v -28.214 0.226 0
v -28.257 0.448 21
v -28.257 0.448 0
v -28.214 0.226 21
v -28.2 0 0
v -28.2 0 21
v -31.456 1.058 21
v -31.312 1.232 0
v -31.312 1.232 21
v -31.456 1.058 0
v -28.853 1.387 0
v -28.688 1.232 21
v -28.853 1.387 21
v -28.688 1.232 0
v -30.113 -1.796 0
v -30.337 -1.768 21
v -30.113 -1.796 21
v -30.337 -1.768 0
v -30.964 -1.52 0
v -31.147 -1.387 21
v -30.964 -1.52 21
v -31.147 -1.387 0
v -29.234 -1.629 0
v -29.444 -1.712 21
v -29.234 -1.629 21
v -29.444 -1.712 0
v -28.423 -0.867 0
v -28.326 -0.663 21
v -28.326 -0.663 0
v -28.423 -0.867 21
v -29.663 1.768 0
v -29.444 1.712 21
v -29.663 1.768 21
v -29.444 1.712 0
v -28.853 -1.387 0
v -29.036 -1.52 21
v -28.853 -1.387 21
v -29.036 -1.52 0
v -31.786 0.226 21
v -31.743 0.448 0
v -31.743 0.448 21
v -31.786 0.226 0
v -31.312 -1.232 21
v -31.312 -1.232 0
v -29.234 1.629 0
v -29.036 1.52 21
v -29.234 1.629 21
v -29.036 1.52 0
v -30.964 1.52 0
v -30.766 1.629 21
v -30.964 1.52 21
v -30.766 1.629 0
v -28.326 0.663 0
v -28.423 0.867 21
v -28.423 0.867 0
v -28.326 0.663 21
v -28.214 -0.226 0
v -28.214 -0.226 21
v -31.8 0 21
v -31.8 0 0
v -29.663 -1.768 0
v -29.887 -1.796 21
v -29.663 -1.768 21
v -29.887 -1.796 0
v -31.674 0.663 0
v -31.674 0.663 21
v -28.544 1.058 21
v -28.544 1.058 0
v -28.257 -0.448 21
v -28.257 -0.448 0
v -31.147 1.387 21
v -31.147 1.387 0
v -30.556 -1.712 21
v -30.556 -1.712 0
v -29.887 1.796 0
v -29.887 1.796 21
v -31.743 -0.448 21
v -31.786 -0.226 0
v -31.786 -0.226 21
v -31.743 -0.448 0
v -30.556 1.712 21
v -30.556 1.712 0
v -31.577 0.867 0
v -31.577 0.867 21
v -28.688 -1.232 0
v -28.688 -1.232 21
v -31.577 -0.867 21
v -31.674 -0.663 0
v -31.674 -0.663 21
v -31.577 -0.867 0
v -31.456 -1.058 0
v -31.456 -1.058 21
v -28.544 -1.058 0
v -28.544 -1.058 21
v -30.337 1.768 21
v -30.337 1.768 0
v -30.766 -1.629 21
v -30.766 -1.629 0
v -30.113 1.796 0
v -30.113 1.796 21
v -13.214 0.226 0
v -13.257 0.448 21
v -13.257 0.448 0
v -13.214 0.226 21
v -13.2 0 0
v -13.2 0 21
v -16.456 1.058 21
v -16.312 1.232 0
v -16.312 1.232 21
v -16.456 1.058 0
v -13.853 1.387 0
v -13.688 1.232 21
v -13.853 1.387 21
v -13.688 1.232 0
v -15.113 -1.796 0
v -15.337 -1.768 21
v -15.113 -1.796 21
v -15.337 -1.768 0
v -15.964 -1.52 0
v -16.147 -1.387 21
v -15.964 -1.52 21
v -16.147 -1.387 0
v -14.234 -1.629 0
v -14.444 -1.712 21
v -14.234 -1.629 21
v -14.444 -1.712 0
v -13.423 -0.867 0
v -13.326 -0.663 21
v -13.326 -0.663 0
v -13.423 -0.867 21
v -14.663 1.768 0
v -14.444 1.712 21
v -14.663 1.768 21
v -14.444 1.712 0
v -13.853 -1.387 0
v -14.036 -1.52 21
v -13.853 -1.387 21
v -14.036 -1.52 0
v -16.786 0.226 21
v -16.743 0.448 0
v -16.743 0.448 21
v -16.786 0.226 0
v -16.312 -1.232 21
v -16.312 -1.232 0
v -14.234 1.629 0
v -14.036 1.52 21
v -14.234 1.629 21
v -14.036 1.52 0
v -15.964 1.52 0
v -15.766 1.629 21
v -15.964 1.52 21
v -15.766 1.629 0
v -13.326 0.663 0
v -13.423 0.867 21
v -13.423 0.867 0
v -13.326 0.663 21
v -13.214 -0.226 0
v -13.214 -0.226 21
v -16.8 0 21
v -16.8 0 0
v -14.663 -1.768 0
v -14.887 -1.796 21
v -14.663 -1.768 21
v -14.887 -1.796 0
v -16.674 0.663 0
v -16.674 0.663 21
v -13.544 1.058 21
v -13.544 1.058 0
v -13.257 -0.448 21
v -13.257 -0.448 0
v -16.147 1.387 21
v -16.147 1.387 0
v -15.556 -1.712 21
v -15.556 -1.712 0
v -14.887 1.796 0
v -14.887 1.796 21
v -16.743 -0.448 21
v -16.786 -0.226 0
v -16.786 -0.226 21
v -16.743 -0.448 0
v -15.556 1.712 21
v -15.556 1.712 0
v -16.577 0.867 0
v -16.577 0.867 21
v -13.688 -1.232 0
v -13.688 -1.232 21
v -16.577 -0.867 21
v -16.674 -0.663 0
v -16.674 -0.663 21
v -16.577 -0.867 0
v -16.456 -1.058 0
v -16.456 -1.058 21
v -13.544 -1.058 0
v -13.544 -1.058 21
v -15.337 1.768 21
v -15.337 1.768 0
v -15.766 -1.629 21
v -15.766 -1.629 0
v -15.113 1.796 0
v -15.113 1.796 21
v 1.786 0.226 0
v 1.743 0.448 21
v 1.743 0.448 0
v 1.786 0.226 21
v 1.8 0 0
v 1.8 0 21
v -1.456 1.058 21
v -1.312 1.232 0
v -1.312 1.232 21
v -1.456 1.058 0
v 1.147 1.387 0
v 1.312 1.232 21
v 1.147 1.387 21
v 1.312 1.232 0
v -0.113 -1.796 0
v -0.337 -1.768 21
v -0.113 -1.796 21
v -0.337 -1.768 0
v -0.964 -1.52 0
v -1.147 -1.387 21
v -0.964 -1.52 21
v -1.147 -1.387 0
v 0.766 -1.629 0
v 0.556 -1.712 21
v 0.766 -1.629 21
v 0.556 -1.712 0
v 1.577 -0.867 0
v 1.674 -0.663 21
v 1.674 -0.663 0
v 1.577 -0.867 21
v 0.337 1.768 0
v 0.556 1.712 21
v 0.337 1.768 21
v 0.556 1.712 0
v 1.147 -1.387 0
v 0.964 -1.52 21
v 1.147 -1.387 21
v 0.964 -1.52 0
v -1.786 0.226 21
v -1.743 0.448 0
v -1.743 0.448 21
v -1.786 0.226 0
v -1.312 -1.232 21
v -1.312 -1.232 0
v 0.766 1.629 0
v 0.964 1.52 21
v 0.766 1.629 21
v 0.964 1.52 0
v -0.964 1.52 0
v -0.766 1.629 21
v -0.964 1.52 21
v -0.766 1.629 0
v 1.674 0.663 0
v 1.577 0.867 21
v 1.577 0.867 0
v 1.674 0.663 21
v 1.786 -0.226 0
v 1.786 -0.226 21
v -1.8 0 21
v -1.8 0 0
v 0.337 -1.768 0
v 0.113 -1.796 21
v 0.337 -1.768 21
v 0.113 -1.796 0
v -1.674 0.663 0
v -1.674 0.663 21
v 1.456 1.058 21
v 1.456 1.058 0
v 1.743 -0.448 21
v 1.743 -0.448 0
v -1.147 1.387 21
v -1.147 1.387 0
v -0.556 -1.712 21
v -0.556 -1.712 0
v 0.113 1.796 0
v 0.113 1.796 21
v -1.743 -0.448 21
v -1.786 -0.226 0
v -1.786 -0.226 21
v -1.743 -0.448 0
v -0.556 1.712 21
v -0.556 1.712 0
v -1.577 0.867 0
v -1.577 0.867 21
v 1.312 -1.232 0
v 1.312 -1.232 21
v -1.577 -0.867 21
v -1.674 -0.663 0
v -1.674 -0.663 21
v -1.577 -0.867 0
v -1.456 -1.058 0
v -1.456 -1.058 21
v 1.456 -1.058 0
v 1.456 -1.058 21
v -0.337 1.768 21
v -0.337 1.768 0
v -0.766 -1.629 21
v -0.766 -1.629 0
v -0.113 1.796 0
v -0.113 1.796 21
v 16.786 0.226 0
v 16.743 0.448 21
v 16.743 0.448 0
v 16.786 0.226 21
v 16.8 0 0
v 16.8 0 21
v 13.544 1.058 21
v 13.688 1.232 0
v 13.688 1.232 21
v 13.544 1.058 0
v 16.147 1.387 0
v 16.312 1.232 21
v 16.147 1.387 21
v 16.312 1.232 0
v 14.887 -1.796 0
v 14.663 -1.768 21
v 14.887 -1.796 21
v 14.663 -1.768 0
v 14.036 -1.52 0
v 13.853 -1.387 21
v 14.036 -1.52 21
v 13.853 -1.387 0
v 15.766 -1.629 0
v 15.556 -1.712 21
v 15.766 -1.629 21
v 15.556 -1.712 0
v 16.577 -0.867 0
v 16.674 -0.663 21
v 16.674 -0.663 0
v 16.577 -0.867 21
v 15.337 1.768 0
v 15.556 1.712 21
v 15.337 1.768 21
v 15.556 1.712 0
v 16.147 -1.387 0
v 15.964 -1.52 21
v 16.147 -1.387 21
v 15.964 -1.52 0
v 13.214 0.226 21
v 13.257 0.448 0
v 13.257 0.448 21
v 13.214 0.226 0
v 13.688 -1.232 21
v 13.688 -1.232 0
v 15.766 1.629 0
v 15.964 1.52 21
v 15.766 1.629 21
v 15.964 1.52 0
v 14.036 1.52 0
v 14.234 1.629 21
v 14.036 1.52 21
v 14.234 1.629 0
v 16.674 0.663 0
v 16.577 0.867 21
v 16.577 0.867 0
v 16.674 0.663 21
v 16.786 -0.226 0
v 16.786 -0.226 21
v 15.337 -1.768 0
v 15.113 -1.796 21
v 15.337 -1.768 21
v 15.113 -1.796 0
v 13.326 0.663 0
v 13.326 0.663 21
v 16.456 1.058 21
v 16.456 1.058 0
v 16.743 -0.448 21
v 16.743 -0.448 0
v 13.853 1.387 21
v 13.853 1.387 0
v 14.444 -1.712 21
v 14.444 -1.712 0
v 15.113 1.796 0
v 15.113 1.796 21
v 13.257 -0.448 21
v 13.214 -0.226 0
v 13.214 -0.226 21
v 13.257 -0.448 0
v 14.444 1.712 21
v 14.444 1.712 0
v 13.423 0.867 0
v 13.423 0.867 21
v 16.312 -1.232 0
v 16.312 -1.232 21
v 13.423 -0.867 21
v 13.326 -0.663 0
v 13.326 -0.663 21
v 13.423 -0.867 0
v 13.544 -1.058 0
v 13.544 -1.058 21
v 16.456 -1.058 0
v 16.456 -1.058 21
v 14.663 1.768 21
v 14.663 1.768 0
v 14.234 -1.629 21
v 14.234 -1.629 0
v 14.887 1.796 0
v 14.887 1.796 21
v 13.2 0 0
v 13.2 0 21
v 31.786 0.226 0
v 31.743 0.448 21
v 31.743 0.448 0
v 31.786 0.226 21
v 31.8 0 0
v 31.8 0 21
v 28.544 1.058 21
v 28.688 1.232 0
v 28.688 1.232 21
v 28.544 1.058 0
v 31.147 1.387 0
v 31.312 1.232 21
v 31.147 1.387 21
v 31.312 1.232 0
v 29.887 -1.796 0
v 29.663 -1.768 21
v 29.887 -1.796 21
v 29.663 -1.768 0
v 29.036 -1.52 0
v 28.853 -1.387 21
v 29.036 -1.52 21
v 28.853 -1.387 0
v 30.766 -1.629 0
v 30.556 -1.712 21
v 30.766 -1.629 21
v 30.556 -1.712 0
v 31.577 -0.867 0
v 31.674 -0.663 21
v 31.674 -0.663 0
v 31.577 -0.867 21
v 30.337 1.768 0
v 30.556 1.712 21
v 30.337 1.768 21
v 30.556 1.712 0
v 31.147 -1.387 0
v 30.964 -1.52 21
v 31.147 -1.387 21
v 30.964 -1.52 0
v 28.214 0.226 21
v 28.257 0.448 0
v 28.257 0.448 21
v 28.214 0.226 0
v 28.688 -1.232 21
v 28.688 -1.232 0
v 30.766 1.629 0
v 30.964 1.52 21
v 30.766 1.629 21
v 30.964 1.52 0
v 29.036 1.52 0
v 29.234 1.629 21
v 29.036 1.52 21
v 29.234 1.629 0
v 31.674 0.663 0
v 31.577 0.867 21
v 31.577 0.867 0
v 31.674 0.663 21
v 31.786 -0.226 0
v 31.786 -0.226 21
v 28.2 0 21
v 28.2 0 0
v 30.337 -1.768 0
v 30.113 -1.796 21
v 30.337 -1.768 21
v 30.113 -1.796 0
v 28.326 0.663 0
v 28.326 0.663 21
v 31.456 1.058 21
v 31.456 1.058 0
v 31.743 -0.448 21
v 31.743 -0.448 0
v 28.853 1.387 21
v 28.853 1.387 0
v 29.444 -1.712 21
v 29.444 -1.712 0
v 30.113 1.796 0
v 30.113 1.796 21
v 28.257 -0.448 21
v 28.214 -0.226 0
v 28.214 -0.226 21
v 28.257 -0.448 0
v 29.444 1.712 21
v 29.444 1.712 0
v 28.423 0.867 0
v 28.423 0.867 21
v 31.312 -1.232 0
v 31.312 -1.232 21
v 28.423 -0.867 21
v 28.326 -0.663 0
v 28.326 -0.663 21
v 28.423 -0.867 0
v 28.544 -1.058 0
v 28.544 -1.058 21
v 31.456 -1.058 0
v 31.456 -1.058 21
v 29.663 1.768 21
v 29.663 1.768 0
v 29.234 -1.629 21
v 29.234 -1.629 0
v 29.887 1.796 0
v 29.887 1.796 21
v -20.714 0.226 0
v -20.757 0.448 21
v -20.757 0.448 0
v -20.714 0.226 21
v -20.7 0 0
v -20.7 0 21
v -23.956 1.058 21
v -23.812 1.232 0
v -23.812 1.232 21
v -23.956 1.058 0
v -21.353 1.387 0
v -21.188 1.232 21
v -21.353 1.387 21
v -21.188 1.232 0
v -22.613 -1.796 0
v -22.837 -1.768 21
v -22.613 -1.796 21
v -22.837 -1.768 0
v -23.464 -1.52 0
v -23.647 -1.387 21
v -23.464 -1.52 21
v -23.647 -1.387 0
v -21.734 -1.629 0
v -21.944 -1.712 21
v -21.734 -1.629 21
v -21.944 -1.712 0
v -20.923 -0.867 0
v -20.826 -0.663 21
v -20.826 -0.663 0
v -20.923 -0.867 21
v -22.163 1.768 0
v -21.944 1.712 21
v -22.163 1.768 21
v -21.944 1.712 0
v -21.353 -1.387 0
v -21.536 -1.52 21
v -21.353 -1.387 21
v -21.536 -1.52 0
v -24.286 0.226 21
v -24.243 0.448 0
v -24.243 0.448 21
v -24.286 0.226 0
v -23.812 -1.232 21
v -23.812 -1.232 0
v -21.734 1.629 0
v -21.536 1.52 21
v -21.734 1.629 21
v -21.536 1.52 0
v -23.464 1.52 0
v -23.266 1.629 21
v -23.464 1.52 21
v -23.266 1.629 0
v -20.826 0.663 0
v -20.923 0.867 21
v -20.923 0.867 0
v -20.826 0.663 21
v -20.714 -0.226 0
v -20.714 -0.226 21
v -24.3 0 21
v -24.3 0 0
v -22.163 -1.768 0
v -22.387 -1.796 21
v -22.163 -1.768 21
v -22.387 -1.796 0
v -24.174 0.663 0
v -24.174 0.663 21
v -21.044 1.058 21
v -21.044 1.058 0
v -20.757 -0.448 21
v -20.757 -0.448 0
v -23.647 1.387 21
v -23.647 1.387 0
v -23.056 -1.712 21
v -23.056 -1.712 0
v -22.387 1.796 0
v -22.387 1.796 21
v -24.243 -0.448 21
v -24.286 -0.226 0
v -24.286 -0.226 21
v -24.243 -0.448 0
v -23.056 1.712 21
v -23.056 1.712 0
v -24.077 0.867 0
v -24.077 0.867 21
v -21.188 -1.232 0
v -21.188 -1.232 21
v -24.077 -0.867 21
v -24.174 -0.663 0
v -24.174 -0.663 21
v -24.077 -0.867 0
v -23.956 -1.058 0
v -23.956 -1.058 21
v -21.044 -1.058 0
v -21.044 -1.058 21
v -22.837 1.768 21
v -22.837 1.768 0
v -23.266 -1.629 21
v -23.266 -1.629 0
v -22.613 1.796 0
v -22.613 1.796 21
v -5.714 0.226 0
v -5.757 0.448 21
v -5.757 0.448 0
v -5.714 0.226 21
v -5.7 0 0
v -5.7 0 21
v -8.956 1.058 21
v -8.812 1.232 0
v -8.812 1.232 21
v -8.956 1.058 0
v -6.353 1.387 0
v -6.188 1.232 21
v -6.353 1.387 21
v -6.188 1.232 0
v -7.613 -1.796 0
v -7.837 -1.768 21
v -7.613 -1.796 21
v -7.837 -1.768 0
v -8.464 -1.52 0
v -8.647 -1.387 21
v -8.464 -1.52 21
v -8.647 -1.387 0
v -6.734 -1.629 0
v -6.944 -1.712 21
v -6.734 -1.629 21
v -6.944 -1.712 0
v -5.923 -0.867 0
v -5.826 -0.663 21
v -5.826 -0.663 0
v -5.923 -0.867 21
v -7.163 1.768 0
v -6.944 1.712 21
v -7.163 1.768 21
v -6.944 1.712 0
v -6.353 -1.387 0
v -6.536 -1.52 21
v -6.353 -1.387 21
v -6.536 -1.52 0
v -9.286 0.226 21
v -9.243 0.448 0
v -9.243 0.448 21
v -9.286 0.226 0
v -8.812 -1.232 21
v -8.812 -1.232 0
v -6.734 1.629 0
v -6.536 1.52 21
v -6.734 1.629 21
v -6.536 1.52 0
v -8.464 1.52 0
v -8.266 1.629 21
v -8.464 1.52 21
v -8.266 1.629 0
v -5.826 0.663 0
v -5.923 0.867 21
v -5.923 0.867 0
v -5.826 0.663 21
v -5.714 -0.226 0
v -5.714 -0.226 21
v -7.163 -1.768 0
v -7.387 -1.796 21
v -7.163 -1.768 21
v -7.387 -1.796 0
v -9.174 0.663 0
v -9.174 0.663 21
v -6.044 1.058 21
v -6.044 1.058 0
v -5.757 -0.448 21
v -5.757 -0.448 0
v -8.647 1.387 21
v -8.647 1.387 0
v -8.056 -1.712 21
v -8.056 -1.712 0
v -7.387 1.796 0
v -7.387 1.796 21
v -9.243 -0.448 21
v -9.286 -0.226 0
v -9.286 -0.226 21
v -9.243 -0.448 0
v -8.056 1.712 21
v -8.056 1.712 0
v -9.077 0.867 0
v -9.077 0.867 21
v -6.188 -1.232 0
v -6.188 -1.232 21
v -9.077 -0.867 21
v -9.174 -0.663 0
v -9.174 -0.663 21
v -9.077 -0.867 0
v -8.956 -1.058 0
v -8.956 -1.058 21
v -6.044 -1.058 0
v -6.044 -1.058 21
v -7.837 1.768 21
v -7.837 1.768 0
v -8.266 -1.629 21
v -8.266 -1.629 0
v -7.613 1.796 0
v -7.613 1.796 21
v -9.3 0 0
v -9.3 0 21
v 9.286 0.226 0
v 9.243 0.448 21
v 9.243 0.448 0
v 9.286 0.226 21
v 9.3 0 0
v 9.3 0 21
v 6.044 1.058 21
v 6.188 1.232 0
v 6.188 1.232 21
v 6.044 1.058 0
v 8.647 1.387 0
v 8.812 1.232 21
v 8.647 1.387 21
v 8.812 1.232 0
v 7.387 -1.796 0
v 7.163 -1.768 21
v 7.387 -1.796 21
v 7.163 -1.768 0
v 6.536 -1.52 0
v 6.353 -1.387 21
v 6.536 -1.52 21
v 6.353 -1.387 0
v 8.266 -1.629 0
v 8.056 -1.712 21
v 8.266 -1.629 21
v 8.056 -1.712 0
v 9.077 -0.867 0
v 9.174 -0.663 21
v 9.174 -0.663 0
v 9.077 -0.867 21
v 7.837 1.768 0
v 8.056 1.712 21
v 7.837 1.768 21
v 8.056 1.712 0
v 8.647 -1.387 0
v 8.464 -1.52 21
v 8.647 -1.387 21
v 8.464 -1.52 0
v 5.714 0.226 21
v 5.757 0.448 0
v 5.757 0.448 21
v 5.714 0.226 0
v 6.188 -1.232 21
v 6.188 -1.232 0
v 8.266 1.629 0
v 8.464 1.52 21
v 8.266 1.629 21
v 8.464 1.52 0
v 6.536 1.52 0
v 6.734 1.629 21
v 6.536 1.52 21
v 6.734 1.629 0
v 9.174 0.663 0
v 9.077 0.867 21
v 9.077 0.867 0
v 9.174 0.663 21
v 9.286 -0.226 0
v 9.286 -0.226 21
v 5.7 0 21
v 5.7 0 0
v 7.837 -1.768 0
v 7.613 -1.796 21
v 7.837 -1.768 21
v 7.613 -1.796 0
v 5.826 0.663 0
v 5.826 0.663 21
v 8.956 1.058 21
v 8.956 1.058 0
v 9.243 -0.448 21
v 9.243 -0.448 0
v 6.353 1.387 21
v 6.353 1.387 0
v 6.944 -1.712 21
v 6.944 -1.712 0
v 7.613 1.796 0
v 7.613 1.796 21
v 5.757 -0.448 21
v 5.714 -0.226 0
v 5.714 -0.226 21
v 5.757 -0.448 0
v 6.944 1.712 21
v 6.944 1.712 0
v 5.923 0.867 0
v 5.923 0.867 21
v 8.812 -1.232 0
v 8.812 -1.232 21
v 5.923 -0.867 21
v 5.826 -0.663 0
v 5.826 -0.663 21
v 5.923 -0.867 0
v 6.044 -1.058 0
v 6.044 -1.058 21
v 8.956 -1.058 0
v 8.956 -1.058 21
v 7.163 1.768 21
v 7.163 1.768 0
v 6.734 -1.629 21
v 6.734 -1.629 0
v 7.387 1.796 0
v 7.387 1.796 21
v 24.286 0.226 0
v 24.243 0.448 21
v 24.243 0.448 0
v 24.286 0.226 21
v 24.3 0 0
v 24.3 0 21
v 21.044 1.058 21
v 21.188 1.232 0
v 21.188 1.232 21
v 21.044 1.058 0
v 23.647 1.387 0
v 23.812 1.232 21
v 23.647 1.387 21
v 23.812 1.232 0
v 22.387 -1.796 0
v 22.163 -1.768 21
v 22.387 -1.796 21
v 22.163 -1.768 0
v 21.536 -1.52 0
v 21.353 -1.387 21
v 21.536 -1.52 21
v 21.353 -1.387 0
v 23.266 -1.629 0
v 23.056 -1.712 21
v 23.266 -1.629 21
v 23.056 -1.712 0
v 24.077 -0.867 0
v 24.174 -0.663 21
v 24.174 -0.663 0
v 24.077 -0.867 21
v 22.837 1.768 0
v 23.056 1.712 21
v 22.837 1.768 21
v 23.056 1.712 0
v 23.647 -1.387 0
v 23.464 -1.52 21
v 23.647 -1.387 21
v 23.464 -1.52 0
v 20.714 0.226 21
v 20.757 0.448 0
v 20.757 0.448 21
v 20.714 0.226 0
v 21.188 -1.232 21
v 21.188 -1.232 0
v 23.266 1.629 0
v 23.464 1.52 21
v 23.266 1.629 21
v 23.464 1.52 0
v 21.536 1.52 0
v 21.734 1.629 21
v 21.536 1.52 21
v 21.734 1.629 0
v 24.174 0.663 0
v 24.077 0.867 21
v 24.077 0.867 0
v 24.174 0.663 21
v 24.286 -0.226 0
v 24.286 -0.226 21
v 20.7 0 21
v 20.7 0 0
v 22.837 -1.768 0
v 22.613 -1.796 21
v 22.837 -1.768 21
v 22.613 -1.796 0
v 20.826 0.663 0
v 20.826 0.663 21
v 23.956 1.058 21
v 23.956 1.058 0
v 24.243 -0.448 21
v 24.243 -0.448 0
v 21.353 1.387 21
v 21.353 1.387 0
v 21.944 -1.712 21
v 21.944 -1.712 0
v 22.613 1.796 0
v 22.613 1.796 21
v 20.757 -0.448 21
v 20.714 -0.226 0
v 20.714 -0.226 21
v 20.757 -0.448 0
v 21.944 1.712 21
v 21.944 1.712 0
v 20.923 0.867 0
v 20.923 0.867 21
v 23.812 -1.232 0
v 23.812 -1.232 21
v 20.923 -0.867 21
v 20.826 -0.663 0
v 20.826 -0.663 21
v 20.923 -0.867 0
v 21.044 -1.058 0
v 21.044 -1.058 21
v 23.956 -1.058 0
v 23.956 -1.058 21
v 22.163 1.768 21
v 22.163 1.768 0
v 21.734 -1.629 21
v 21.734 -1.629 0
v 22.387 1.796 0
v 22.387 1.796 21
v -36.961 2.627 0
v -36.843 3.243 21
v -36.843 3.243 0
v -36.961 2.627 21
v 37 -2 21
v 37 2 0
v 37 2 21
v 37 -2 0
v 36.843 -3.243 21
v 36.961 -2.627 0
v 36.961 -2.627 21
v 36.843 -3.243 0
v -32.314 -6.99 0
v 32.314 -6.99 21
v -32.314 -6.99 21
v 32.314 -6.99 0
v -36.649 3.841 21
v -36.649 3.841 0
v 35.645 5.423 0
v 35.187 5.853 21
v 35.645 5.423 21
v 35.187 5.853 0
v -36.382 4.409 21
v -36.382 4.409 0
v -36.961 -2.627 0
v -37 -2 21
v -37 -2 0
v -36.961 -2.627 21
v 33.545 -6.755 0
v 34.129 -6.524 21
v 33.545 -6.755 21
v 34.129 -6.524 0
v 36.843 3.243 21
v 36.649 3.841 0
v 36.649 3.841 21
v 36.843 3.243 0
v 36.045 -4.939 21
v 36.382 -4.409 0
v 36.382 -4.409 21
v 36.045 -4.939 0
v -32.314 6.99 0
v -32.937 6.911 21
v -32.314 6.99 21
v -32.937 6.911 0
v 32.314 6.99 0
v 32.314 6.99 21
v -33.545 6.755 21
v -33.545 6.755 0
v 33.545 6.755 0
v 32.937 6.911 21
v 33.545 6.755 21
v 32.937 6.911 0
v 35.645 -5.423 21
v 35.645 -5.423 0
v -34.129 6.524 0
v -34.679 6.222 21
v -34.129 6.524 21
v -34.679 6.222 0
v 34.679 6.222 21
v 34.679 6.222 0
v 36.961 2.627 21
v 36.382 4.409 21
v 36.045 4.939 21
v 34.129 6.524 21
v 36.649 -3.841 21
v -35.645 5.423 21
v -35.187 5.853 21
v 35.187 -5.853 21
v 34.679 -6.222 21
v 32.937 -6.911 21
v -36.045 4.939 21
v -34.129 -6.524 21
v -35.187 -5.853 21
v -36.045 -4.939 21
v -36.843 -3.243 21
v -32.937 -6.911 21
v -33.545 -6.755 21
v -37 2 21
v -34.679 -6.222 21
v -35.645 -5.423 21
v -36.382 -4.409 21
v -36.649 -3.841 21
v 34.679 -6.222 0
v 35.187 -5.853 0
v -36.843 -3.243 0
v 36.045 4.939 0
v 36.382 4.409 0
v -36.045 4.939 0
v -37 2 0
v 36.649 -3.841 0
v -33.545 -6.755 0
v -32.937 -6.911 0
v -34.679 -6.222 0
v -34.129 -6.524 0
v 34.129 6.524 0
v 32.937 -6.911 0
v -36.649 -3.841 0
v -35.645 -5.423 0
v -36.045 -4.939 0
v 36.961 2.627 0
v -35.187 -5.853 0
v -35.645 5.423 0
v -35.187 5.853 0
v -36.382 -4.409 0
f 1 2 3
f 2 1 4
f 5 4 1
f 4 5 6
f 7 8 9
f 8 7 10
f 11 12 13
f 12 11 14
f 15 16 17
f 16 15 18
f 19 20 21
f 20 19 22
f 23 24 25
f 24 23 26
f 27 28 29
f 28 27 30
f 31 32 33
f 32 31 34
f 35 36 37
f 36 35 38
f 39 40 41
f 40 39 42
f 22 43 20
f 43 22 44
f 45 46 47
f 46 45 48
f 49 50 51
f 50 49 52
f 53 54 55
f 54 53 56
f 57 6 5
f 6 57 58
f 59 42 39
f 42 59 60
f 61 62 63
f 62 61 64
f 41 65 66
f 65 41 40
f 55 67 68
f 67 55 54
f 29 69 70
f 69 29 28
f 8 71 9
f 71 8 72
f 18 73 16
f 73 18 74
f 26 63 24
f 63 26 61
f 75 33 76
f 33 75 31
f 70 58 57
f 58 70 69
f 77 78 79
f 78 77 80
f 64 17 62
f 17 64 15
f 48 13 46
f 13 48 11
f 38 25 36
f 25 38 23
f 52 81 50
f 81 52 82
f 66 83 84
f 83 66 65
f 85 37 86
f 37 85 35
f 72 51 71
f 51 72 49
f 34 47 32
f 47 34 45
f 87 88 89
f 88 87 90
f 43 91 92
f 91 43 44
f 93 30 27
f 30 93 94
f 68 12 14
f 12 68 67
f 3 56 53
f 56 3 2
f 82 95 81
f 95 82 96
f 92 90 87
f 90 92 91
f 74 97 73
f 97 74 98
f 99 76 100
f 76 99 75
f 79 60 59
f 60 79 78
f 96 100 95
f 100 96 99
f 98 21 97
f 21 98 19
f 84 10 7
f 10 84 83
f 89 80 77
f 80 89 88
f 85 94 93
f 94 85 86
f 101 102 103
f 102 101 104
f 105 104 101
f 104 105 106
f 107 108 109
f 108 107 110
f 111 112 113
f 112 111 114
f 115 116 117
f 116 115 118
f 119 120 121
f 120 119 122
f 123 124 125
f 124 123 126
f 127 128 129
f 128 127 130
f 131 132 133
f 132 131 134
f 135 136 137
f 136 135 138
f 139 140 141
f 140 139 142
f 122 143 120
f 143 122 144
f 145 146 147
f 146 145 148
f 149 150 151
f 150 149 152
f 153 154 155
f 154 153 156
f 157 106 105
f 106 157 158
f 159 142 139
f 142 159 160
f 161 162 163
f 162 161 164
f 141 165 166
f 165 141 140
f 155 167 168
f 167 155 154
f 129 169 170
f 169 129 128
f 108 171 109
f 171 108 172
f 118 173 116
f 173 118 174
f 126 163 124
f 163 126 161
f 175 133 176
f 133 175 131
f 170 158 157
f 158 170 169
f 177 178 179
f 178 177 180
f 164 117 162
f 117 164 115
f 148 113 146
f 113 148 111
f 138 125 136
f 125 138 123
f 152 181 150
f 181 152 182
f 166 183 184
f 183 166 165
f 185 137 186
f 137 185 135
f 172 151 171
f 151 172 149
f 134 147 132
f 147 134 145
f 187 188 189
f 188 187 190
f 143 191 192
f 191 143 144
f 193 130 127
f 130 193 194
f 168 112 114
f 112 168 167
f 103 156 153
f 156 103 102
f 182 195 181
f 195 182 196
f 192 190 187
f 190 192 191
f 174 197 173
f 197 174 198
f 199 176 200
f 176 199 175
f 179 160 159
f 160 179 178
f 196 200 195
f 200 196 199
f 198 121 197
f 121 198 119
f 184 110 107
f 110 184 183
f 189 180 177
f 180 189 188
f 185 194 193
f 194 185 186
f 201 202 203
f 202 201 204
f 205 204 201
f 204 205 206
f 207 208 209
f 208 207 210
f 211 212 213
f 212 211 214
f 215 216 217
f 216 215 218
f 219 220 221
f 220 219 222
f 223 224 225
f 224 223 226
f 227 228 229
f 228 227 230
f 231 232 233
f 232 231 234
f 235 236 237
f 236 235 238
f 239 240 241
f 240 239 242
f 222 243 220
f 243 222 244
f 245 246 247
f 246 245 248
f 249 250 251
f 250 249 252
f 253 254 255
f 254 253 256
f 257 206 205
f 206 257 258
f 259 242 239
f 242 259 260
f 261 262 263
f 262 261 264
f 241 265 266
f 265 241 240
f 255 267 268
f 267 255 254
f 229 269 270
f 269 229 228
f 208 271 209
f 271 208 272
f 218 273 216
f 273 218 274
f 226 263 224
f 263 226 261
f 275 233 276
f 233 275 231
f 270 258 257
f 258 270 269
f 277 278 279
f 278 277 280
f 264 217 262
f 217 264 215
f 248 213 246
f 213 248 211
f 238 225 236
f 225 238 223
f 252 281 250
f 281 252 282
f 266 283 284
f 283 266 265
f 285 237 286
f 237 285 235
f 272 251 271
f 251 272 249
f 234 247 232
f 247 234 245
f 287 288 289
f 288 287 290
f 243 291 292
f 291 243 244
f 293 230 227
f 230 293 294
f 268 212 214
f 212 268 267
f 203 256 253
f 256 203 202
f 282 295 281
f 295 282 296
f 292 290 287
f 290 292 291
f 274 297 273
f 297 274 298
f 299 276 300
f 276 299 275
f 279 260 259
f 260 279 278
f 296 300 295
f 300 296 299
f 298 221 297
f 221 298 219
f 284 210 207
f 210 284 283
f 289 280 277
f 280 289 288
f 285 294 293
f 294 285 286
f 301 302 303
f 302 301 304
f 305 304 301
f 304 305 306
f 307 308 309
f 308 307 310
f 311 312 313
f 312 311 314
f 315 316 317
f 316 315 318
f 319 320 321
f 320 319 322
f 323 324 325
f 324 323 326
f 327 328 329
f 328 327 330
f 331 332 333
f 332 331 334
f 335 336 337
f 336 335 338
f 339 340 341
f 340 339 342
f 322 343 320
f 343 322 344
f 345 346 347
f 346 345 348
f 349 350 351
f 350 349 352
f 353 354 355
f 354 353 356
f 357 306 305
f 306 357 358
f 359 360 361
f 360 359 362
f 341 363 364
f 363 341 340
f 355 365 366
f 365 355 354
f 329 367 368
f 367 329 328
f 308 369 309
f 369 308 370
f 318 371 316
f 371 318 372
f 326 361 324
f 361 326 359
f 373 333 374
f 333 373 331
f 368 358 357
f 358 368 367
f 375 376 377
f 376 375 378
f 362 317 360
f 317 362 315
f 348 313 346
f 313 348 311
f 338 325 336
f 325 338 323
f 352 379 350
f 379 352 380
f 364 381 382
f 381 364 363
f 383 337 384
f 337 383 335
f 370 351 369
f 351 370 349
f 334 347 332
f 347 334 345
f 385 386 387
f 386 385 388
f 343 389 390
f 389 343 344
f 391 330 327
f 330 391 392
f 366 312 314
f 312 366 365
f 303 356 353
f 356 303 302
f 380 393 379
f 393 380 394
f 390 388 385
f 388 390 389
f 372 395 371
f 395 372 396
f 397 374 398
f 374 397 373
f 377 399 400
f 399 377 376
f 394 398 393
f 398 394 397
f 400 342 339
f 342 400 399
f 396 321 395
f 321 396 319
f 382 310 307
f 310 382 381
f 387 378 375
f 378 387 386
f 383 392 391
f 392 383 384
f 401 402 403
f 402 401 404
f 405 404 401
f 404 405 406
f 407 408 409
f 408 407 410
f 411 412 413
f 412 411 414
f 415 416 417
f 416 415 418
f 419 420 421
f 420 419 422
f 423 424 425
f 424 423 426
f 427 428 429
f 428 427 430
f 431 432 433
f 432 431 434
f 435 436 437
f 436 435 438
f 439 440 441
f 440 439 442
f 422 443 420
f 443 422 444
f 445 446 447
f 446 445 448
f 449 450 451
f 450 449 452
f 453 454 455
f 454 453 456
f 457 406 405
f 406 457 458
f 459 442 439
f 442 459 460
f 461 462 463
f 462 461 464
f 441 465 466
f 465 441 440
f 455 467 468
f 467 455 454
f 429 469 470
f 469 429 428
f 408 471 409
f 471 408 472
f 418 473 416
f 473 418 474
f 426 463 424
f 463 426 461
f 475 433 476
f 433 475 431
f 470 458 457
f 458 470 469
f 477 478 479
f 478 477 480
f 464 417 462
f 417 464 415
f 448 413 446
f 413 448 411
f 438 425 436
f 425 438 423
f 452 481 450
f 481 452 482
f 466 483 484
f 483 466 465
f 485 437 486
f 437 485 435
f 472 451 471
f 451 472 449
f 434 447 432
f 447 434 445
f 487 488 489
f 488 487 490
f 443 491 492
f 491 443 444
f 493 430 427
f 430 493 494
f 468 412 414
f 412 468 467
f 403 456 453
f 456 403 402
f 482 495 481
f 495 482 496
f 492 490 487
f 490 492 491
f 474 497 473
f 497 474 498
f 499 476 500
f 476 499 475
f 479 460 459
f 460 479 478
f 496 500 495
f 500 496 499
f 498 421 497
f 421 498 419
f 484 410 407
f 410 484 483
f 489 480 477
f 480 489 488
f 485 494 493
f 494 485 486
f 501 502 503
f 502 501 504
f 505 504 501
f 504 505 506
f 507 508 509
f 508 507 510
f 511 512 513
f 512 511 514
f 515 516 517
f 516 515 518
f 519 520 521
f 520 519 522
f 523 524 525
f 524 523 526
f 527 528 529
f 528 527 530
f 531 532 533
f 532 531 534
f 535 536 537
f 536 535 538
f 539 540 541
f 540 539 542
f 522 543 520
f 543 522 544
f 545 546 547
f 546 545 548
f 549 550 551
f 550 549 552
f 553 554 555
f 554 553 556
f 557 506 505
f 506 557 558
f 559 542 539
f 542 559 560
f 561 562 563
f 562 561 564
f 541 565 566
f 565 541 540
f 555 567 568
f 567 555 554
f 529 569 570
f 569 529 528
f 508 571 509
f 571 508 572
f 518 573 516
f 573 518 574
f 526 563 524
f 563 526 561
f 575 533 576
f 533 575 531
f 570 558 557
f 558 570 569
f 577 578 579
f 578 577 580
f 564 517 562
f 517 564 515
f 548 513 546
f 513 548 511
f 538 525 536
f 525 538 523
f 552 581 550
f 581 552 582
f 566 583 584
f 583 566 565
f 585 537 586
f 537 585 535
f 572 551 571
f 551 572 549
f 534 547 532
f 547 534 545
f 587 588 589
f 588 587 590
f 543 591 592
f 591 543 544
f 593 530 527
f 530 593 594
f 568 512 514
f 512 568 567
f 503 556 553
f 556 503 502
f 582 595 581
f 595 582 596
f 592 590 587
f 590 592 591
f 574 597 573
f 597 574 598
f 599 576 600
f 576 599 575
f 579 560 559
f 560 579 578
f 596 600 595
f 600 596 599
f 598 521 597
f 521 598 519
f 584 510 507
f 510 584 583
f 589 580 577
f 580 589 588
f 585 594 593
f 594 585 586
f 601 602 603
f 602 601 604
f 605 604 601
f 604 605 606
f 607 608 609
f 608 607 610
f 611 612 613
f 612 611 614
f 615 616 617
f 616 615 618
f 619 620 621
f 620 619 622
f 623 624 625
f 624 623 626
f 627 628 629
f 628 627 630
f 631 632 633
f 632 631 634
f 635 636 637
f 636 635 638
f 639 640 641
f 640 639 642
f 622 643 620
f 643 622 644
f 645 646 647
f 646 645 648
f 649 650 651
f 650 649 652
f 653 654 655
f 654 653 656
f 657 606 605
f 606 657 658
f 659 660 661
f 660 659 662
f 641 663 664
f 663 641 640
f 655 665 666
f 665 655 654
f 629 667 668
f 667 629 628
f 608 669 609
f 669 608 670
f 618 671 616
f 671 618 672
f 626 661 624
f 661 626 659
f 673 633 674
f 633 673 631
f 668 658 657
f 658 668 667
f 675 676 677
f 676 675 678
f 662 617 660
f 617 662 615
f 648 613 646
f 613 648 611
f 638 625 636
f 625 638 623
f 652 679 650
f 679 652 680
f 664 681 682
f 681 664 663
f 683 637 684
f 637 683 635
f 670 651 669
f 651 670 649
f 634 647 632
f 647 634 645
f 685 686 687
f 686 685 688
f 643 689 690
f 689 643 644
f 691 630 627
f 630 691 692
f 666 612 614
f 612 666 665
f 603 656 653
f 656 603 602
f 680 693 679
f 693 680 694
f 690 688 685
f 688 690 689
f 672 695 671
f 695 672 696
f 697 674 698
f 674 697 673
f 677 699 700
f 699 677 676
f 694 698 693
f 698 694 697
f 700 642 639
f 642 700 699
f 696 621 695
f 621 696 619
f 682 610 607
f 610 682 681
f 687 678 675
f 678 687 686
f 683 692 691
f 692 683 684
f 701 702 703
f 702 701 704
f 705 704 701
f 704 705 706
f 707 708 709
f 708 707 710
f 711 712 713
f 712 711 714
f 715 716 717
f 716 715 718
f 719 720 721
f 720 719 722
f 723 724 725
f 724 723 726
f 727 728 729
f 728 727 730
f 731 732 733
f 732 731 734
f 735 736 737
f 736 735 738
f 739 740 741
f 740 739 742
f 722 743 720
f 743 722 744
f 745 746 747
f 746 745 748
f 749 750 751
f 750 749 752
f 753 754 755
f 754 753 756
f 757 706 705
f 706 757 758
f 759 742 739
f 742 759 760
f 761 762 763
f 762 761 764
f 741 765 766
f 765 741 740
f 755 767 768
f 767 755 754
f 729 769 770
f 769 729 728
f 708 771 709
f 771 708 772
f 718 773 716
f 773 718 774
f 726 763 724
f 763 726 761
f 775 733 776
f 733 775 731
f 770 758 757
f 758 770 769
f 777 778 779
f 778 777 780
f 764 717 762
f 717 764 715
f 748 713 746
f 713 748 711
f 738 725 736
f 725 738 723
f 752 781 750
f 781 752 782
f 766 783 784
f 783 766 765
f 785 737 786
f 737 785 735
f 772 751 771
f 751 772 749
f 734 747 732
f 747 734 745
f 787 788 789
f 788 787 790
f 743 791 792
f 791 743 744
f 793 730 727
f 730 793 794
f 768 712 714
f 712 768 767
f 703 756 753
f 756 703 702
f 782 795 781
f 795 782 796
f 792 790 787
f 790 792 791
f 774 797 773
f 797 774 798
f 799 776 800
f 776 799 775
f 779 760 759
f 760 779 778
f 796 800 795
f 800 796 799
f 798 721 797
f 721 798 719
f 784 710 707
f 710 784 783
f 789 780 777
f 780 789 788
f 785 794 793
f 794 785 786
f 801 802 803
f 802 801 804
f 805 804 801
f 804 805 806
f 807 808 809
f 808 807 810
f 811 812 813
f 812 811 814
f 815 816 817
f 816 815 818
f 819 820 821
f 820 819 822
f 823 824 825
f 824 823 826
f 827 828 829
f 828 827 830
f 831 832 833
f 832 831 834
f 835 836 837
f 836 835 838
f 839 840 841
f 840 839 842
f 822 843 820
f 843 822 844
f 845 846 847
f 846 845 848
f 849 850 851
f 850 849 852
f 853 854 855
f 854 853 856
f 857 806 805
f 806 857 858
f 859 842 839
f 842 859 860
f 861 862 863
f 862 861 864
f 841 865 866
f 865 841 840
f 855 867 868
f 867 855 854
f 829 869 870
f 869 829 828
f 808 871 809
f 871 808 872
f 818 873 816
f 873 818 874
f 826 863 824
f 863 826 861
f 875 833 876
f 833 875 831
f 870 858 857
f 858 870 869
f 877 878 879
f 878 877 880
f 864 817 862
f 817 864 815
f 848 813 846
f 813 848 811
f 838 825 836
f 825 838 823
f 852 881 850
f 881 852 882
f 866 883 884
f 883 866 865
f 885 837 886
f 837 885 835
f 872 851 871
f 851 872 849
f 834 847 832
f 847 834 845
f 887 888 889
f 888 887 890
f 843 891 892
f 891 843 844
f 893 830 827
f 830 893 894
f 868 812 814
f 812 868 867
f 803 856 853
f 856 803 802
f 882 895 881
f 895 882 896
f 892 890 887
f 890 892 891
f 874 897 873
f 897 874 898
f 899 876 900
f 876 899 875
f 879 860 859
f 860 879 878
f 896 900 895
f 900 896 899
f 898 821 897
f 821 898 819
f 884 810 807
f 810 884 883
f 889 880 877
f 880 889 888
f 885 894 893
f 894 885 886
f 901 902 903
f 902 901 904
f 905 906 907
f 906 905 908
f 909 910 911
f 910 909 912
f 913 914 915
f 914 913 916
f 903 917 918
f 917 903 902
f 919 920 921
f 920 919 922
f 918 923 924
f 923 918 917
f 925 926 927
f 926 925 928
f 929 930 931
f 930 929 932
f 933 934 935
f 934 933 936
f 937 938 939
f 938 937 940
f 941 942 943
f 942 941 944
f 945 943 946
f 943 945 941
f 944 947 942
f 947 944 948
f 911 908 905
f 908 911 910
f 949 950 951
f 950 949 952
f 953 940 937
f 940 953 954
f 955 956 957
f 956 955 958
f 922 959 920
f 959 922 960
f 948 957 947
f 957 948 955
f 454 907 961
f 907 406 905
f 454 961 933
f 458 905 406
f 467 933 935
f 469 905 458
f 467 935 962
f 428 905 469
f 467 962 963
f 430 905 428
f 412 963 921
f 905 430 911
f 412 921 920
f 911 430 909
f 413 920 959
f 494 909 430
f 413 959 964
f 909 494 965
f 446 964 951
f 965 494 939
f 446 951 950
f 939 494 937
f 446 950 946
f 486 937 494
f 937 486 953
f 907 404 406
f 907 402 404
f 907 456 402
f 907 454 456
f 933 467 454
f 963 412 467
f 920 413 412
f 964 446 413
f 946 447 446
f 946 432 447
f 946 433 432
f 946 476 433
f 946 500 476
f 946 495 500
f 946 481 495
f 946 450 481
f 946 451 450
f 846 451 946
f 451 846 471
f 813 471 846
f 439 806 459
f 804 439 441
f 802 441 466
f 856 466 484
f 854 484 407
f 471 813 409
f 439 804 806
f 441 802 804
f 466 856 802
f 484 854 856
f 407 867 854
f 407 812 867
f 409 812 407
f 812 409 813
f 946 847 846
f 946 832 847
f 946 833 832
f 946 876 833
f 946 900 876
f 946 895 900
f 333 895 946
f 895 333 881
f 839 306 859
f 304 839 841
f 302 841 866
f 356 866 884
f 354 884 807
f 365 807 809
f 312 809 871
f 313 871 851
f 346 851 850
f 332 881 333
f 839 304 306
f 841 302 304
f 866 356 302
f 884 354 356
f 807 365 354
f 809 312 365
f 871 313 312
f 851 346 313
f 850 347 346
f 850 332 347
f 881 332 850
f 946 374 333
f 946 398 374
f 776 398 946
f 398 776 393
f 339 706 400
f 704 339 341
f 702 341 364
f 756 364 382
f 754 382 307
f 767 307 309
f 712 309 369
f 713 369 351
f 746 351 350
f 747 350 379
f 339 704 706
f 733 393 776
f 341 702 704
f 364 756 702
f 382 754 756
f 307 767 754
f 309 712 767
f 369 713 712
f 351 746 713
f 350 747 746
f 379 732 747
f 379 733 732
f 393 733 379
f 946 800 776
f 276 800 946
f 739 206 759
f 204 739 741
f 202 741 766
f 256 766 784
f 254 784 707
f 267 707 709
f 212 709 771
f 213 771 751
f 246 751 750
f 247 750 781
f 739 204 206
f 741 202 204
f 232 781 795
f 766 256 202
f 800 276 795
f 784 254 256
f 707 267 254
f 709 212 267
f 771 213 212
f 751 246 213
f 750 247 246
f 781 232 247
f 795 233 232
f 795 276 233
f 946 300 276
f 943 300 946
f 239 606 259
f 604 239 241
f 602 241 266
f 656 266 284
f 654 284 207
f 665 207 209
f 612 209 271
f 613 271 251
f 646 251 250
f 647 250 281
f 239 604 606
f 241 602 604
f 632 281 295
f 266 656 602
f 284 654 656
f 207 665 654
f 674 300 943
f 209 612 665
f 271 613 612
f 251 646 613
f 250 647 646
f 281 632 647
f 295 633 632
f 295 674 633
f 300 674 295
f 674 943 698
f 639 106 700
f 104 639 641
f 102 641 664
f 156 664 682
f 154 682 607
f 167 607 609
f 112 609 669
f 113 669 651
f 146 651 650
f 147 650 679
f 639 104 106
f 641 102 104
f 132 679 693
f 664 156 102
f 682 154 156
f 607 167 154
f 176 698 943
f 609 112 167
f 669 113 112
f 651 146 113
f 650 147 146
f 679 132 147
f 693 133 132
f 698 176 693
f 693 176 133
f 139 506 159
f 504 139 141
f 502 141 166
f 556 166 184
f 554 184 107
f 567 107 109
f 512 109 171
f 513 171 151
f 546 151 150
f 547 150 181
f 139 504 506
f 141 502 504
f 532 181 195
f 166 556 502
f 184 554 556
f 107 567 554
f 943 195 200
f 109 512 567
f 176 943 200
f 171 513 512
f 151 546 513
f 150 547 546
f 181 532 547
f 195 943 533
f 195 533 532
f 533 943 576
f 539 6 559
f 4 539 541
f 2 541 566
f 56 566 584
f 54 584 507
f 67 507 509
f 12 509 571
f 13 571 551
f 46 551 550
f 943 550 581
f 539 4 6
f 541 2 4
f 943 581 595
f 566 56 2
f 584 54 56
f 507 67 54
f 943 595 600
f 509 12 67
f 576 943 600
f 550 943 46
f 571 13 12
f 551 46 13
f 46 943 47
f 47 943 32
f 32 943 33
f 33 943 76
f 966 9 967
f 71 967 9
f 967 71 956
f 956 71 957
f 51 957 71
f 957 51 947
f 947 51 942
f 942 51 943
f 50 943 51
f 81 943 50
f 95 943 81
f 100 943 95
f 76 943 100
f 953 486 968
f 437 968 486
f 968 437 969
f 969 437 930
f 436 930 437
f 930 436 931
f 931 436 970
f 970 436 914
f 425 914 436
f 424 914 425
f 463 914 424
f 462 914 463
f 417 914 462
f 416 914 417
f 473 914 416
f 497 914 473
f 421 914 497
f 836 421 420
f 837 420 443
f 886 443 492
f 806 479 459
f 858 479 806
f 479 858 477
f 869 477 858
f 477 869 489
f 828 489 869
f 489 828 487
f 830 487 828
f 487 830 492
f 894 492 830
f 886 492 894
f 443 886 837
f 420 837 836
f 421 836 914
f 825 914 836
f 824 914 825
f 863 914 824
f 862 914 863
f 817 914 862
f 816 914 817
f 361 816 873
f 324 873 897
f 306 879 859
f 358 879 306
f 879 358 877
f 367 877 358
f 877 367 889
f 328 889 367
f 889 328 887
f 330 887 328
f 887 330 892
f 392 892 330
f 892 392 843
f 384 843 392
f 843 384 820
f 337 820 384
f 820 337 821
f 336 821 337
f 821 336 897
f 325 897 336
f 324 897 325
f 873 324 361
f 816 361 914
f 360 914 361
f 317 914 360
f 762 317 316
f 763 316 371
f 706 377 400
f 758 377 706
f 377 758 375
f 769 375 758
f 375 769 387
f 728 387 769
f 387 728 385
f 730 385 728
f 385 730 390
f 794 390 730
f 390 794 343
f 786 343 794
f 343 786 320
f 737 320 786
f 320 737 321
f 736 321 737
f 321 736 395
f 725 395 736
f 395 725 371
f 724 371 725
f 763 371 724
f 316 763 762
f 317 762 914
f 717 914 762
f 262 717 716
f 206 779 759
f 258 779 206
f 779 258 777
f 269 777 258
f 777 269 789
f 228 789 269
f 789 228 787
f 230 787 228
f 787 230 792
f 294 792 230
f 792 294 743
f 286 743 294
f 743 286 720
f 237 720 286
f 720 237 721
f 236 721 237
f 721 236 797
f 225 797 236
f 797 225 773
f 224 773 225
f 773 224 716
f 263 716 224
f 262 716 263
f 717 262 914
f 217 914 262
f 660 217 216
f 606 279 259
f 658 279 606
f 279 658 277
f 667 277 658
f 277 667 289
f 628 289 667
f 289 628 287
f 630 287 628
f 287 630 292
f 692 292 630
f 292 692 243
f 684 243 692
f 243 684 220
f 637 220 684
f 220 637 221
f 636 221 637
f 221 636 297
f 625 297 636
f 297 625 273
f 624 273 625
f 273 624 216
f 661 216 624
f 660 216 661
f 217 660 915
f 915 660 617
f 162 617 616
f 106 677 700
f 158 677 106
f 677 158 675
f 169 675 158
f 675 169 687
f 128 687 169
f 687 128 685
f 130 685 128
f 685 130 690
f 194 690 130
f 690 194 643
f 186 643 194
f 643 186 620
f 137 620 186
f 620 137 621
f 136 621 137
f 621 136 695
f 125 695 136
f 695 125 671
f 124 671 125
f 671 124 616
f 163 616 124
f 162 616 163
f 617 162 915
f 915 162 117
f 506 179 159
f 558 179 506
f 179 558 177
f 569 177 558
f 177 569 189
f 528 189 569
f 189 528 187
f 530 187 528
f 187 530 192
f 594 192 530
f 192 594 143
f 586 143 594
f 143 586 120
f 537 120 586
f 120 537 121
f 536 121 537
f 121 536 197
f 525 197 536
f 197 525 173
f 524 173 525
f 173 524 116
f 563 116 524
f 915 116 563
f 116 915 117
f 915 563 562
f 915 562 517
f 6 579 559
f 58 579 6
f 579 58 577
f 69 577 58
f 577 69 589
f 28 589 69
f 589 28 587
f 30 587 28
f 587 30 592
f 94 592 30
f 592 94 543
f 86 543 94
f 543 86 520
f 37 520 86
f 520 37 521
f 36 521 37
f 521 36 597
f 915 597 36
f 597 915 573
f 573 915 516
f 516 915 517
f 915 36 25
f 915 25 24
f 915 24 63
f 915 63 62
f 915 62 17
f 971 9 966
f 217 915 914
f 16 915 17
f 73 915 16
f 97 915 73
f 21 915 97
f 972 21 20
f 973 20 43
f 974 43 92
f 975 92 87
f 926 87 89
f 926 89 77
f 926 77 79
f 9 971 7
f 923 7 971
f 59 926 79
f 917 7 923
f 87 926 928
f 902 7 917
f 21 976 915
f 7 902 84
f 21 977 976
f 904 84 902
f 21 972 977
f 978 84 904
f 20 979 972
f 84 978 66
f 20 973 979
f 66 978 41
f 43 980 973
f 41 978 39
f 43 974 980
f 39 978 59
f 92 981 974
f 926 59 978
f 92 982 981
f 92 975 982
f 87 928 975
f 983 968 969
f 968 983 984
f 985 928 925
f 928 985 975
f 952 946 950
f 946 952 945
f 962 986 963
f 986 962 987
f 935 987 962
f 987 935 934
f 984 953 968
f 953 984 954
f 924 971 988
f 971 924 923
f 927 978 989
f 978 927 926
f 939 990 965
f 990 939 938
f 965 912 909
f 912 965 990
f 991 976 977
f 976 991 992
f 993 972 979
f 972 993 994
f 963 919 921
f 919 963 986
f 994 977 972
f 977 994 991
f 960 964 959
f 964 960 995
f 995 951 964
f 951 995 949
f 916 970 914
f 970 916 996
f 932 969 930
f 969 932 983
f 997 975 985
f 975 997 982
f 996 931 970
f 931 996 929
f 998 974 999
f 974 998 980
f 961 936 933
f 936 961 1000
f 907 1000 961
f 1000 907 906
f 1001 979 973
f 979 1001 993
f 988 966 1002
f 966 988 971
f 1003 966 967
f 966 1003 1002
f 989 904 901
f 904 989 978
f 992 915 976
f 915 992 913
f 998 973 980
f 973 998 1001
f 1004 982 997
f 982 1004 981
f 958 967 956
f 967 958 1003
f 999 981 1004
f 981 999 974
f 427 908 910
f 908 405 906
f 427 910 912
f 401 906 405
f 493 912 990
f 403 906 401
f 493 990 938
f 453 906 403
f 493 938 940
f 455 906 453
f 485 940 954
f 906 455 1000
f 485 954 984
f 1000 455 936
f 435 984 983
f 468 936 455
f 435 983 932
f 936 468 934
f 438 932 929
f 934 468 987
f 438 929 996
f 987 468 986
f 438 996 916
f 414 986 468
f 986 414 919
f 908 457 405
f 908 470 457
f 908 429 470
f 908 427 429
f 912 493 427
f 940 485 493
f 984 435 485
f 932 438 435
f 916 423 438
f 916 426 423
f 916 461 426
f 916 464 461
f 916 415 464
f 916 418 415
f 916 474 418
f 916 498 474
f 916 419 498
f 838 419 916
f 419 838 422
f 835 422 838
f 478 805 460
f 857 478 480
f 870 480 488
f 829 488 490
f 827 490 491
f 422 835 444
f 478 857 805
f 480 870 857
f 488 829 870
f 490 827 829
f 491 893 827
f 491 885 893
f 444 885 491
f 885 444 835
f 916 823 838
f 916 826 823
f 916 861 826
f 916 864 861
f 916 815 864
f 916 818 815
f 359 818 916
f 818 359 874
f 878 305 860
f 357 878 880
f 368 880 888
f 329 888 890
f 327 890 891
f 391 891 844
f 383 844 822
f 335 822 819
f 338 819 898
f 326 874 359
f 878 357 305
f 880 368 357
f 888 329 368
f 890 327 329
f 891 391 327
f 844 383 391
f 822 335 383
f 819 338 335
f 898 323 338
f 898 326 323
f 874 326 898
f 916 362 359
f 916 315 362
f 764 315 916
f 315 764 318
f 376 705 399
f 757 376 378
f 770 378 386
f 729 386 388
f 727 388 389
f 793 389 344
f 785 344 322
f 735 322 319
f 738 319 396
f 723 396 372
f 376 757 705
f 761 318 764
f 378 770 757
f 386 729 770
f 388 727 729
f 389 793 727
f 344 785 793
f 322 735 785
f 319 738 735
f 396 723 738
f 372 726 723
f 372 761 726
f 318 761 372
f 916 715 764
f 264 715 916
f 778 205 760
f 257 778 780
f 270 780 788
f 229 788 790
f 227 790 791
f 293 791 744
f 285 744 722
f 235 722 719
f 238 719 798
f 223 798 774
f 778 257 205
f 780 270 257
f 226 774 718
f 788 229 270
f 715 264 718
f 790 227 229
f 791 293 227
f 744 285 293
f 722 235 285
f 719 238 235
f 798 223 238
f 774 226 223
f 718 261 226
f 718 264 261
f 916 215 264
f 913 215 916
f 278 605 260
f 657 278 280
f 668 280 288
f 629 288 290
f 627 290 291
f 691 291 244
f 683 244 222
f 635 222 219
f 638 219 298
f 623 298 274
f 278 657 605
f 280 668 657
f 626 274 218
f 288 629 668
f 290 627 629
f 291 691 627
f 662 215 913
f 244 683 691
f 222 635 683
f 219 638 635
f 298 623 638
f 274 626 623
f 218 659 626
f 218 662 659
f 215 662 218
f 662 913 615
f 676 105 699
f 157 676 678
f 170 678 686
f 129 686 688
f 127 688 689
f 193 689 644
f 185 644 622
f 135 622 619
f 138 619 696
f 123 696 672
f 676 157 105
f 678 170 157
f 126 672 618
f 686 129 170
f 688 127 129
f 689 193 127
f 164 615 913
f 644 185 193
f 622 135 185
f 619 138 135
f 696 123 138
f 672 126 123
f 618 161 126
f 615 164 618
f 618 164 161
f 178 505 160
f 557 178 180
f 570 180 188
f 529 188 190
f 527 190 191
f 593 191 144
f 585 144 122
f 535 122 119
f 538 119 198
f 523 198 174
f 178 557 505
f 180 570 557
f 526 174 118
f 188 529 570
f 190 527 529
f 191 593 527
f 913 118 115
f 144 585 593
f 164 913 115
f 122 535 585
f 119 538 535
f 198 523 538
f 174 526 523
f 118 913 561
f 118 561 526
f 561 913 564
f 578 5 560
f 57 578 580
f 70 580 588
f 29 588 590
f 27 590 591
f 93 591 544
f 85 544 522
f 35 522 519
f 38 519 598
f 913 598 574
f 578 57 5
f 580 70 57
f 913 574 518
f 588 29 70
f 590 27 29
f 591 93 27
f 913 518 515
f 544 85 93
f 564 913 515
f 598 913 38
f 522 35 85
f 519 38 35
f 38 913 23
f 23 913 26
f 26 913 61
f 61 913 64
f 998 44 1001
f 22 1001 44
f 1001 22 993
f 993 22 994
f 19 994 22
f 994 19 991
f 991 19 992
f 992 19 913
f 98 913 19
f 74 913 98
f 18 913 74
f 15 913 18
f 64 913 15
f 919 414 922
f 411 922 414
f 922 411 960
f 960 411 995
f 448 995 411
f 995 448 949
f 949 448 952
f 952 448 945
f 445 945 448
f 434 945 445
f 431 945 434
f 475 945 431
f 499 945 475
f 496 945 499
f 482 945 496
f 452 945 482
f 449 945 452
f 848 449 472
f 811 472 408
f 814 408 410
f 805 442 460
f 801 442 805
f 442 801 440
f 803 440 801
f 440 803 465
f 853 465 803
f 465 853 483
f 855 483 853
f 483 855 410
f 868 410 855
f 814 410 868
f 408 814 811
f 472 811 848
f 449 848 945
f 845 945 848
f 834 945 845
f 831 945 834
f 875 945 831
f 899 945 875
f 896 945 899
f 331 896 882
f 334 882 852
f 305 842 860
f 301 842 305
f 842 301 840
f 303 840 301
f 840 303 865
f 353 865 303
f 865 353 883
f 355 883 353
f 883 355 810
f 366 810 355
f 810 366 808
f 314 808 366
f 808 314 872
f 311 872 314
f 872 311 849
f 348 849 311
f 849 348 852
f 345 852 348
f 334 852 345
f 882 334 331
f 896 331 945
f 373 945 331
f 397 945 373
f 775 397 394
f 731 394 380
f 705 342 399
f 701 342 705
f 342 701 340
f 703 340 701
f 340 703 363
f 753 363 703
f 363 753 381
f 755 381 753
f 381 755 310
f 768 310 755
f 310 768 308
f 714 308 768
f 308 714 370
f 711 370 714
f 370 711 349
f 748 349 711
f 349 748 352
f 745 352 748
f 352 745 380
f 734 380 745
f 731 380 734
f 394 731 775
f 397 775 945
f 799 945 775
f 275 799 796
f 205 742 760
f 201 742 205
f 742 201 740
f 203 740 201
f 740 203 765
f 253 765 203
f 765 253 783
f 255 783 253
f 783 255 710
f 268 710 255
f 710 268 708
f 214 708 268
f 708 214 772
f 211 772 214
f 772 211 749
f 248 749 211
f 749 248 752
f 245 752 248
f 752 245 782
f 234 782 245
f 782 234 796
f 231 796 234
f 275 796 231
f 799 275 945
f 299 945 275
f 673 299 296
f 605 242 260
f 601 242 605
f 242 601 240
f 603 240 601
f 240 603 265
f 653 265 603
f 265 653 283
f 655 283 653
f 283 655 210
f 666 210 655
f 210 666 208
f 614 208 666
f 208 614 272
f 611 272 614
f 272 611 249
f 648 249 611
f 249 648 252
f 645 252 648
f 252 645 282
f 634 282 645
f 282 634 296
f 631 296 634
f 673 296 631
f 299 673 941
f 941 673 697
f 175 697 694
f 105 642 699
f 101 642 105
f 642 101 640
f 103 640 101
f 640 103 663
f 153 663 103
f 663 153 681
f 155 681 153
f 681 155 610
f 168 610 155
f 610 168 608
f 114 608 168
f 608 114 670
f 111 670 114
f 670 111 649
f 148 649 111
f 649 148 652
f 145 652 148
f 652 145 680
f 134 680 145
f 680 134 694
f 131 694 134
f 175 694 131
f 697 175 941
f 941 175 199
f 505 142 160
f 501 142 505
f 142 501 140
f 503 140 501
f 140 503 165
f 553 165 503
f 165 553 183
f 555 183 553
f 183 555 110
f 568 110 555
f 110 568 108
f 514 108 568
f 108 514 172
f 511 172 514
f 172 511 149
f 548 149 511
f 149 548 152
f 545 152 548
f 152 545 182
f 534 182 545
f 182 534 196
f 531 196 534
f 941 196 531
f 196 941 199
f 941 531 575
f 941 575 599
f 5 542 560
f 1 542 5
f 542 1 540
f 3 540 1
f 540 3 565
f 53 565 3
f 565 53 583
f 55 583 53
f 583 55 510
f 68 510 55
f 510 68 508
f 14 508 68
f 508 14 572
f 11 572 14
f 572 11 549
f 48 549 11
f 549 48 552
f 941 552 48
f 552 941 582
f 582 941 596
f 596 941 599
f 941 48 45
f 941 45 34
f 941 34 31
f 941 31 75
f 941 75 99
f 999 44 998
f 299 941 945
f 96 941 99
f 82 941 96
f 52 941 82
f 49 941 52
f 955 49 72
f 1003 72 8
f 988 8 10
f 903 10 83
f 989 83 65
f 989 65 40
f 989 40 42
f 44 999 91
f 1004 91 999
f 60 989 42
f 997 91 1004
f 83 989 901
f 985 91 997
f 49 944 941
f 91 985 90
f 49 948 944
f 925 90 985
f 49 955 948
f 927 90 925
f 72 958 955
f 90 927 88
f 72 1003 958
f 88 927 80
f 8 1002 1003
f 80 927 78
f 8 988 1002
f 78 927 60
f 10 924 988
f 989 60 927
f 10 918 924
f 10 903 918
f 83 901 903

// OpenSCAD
$fn = 50;


difference() {
	union() {
		hull() {
			translate(v = [-32.0000000000, 2.0000000000, 0]) {
				cylinder(h = 21, r = 5);
			}
			translate(v = [32.0000000000, 2.0000000000, 0]) {
				cylinder(h = 21, r = 5);
			}
			translate(v = [-32.0000000000, -2.0000000000, 0]) {
				cylinder(h = 21, r = 5);
			}
			translate(v = [32.0000000000, -2.0000000000, 0]) {
				cylinder(h = 21, r = 5);
			}
		}
	}
	union() {
		translate(v = [-30.0000000000, 0.0000000000, 0]) {
			translate(v = [0, 0, -100]) {
				cylinder(h = 200, r = 1.8000000000);
			}
		}
		translate(v = [-15.0000000000, 0.0000000000, 0]) {
			translate(v = [0, 0, -100]) {
				cylinder(h = 200, r = 1.8000000000);
			}
		}
		translate(v = [0, 0, -100]) {
			cylinder(h = 200, r = 1.8000000000);
		}
		translate(v = [15.0000000000, 0.0000000000, 0]) {
			translate(v = [0, 0, -100]) {
				cylinder(h = 200, r = 1.8000000000);
			}
		}
		translate(v = [30.0000000000, 0.0000000000, 0]) {
			translate(v = [0, 0, -100]) {
				cylinder(h = 200, r = 1.8000000000);
			}
		}
		translate(v = [-30.0000000000, 0.0000000000, 0]) {
			translate(v = [0, 0, -100]) {
				cylinder(h = 200, r = 1.8000000000);
			}
		}
		translate(v = [-22.5000000000, 0.0000000000, 0]) {
			translate(v = [0, 0, -100]) {
				cylinder(h = 200, r = 1.8000000000);
			}
		}
		translate(v = [-15.0000000000, 0.0000000000, 0]) {
			translate(v = [0, 0, -100]) {
				cylinder(h = 200, r = 1.8000000000);
			}
		}
		translate(v = [-7.5000000000, 0.0000000000, 0]) {
			translate(v = [0, 0, -100]) {
				cylinder(h = 200, r = 1.8000000000);
			}
		}
		translate(v = [0, 0, -100]) {
			cylinder(h = 200, r = 1.8000000000);
		}
		translate(v = [7.5000000000, 0.0000000000, 0]) {
			translate(v = [0, 0, -100]) {
				cylinder(h = 200, r = 1.8000000000);
			}
		}
		translate(v = [15.0000000000, 0.0000000000, 0]) {
			translate(v = [0, 0, -100]) {
				cylinder(h = 200, r = 1.8000000000);
			}
		}
		translate(v = [22.5000000000, 0.0000000000, 0]) {
			translate(v = [0, 0, -100]) {
				cylinder(h = 200, r = 1.8000000000);
			}
		}
		translate(v = [30.0000000000, 0.0000000000, 0]) {
			translate(v = [0, 0, -100]) {
				cylinder(h = 200, r = 1.8000000000);
			}
		}
	}
}
